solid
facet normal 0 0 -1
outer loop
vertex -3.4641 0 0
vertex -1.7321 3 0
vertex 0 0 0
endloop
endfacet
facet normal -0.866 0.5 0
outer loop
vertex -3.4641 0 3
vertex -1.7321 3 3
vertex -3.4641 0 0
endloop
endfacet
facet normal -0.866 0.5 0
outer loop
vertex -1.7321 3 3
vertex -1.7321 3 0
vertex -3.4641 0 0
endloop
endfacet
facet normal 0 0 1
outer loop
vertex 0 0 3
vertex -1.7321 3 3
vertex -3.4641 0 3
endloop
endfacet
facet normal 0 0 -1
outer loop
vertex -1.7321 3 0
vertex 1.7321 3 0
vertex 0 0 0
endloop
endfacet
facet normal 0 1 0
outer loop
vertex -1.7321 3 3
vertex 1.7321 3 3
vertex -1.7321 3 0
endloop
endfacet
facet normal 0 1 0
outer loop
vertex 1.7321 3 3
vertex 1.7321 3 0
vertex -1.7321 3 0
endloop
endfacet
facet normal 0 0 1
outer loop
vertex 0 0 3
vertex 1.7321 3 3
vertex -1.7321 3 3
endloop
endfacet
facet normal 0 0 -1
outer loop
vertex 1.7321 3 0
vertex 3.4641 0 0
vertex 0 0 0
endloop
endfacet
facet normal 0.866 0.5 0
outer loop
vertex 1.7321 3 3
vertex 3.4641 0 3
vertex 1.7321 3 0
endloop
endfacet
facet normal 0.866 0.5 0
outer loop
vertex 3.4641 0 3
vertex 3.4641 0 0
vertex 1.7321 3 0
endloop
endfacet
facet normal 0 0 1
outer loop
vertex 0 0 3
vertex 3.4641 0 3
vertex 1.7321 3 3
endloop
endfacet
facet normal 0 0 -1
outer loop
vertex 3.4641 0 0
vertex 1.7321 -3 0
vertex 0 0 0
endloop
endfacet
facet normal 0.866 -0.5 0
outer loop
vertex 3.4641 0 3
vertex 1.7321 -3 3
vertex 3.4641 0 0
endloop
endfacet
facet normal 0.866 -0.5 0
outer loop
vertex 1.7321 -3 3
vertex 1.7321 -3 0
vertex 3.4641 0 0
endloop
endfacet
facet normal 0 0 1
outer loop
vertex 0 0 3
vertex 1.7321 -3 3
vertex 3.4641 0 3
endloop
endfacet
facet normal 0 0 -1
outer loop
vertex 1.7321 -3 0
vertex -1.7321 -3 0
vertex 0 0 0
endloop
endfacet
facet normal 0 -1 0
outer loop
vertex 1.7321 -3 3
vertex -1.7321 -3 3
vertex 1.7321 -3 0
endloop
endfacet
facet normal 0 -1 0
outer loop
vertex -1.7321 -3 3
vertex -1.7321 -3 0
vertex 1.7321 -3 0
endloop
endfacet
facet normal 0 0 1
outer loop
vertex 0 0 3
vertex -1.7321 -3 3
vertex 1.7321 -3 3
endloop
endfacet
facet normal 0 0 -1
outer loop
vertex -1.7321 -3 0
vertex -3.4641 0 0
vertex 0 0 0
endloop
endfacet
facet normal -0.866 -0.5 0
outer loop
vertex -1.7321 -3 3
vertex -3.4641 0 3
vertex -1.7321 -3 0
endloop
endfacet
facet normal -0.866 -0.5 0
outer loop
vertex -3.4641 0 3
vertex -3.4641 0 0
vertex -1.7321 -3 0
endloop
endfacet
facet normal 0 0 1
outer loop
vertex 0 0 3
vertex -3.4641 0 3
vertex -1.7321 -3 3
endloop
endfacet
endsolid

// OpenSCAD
// a nut shape that takes height and width across flats as input.

nutShape(6, 3);

module nutShape(w, h)
{
    rotate_extrude($fn = 6)
        square([((w / 2) / (cos(30))), h], center = false);
}
